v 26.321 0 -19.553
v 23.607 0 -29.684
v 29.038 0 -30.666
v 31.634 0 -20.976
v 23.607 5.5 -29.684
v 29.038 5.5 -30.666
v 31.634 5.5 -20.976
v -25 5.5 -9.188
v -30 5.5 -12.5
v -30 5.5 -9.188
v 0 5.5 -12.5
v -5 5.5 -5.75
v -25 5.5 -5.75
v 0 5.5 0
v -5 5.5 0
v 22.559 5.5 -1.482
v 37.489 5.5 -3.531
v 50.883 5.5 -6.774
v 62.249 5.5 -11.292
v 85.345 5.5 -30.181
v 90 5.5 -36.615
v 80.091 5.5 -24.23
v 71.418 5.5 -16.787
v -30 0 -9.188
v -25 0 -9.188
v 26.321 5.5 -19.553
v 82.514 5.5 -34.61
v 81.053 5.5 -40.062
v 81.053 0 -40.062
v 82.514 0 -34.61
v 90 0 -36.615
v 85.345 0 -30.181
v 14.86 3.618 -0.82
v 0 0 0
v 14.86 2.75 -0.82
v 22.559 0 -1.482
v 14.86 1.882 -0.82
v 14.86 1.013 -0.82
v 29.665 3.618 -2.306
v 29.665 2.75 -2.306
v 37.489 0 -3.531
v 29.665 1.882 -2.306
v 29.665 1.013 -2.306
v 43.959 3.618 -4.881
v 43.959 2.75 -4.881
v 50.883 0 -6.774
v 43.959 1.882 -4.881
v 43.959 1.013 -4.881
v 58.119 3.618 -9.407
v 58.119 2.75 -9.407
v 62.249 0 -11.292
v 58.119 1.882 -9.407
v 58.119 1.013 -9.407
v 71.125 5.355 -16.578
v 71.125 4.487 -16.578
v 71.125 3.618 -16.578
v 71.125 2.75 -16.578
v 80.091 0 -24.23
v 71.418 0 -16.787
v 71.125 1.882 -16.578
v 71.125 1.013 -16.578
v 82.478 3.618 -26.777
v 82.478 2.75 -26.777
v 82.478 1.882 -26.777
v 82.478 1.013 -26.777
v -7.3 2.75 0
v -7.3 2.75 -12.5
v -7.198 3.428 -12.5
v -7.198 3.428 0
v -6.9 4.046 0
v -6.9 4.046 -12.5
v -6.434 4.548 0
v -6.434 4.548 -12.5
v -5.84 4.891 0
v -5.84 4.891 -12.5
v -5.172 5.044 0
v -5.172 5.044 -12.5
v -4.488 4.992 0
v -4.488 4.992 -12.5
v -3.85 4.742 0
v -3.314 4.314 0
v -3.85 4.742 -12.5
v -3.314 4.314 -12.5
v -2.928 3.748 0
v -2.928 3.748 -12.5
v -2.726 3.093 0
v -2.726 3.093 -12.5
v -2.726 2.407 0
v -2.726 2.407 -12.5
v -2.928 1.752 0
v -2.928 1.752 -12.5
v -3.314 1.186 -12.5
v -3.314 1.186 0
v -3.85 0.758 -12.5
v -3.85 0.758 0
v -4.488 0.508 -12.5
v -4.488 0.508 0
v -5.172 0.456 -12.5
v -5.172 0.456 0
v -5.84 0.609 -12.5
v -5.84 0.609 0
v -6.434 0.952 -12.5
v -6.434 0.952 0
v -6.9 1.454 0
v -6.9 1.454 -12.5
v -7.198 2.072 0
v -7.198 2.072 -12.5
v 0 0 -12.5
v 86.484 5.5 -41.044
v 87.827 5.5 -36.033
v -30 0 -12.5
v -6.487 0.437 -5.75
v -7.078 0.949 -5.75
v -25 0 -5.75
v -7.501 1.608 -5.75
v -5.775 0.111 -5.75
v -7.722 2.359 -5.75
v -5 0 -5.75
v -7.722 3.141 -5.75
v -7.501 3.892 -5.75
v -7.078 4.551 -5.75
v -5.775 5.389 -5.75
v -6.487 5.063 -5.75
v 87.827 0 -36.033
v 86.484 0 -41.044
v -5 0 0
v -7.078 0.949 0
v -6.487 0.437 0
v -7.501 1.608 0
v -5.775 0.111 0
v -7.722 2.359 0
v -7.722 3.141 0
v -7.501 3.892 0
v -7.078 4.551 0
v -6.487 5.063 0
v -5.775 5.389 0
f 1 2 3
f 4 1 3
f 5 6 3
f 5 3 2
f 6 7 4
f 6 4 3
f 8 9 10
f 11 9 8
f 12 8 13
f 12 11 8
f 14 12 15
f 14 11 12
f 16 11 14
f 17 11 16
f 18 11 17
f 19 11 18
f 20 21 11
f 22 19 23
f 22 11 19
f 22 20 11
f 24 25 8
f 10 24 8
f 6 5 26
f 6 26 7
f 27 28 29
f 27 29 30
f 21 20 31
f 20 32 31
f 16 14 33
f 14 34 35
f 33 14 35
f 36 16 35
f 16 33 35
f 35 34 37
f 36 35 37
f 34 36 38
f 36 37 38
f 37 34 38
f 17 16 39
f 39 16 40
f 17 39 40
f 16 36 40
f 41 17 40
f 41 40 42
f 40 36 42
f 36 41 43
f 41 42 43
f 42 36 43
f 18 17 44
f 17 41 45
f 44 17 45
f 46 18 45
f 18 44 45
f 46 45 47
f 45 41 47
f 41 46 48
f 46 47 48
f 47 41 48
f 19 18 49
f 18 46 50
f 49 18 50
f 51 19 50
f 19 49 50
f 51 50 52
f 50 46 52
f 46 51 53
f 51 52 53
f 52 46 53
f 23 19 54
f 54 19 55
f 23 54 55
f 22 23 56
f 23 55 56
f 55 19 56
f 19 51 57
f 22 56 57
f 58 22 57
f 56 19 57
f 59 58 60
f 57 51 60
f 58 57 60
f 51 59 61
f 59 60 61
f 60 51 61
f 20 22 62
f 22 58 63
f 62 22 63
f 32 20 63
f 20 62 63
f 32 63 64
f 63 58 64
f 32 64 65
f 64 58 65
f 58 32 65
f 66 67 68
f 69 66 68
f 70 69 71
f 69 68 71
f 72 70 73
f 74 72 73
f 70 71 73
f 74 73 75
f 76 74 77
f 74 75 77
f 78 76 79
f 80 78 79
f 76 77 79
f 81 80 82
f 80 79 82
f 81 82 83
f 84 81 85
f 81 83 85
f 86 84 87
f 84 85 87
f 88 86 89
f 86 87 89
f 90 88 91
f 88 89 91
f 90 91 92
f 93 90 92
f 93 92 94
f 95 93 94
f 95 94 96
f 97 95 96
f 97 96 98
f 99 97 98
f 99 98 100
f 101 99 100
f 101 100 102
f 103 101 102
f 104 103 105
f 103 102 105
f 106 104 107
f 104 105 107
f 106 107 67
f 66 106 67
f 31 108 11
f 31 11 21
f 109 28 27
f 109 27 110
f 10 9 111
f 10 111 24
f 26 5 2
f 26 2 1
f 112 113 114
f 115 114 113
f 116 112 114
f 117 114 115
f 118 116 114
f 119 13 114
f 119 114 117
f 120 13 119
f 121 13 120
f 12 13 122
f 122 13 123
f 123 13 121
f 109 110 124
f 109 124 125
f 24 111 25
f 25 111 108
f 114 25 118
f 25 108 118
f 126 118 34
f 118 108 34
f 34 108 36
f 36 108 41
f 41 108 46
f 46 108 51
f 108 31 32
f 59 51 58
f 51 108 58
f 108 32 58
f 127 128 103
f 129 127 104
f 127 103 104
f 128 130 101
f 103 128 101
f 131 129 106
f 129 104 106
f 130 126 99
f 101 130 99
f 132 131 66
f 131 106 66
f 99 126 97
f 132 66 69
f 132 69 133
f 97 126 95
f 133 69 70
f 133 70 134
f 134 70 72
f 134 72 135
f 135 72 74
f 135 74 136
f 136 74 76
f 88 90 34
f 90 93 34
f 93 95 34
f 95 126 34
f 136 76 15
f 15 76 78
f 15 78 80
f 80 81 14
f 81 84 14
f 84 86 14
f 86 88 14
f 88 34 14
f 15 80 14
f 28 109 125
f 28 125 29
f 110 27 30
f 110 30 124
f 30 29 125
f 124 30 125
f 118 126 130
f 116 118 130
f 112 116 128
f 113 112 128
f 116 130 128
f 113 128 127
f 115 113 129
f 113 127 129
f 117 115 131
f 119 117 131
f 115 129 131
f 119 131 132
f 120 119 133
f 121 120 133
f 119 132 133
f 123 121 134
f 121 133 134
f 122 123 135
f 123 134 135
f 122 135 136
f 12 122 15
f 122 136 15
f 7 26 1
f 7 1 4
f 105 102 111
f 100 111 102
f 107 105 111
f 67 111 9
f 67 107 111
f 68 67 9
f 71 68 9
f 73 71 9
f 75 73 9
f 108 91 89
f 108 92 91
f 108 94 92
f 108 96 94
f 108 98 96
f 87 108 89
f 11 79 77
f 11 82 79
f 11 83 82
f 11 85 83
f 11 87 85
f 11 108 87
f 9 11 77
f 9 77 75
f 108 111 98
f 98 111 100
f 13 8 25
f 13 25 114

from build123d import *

# Parameters (mm, degrees)
SALIENTE_EXTRUIR1_DEPTH   = 5.5
CROQUIS3_W                = 12.5
CROQUIS3_H                = 5.5
SALIENTE_EXTRUIR2_DEPTH   = 25
CROQUIS4_R                = 2.3
CORTAR_EXTRUIR3_DEPTH     = 12.5
CORTAR_EXTRUIR2_DEPTH     = 5.75
CROQUIS6_W                = 3.3125
CROQUIS6_H                = 5.5
SALIENTE_EXTRUIR3_DEPTH   = 5
SALIENTE_EXTRUIR6_DEPTH   = 5.5
SALIENTE_EXTRUIR6_2_DEPTH = 5.5


with BuildPart() as part:
    # Croquis2 → Saliente-Extruir1 (new body)
    with BuildSketch(Plane(origin=(0, 0, 0), x_dir=(1, 0, 0), z_dir=(0, 1, 0))):
        with BuildLine():
            Line((0, 0), (0, 12.5))
            Line((0, 12.5), (90, 36.615427319))
            add(Edge.make_bspline(
                [(0, 0), (0.391394635, 0.015775005), (1.186974035, 0.048775969), (2.973718865, 0.125104104), (4.540088904, 0.200260299), (6.566615662, 0.300718996), (8.325276336, 0.397659311), (10.239345298, 0.508699867), (12.06569896, 0.624646025), (14.401457649, 0.783062706), (17.174575564, 0.991527453), (20.424315772, 1.267095632), (24.124041131, 1.631890725), (28.746499447, 2.160588299), (34.186717026, 2.916408992), (39.59920567, 3.869463595), (44.959442778, 5.077074293), (49.361815827, 6.280418231), (52.910692092, 7.400878923), (56.408168852, 8.673928793), (59.841449897, 10.111450972), (63.196917977, 11.722972852), (66.459987179, 13.514457641), (69.616669404, 15.487724177), (72.654216734, 17.639793831), (75.562633469, 19.963554552), (78.411401775, 22.516402339), (80.637238299, 24.750127709), (82.31420302, 26.576865179), (83.500174761, 27.941909388), (84.166451521, 28.729544399), (84.824720597, 29.529498585), (85.467901785, 30.330572576), (86.10961807, 31.152932899), (86.725824802, 31.959637263), (87.359215775, 32.814913902), (87.935303716, 33.605334305), (88.585351463, 34.5293994), (89.07725637, 35.234721433), (89.639386065, 36.072003958), (89.880241627, 36.43386466), (90, 36.615427319)],
                knots=[0.074542826, 0.074542826, 0.074542826, 0.074542826, 0.074542826, 0.089942005, 0.105341185, 0.120740364, 0.136139543, 0.151538723, 0.166937902, 0.182337082, 0.197736262, 0.22853462, 0.259332978, 0.290131335, 0.320929692, 0.382526405, 0.441205382, 0.472003704, 0.502802054, 0.533600416, 0.564398766, 0.595197066, 0.625995423, 0.656793872, 0.687592091, 0.718390433, 0.749188737, 0.779987363, 0.814189109, 0.822739652, 0.831290195, 0.839840738, 0.848391281, 0.856941796, 0.865492311, 0.874042825, 0.88259334, 0.891143874, 0.899694409, 0.908244943, 0.916795477, 0.916795477, 0.916795477, 0.916795477, 0.916795477], degree=4))
        make_face()
    extrude(amount=SALIENTE_EXTRUIR1_DEPTH)

    # Croquis3 → Saliente-Extruir2 (add)
    with BuildSketch(Plane.ZY):
        with Locations((-6.25, 2.75)):
            Rectangle(CROQUIS3_W, CROQUIS3_H)
    extrude(amount=SALIENTE_EXTRUIR2_DEPTH)

    # Croquis4 → Cortar-Extruir3 (cut)
    with BuildSketch(Plane(origin=(0, 0, -12.5), x_dir=(-1, 0, 0), z_dir=(0, 0, -1))):
        with Locations((5, 2.75)):
            Circle(CROQUIS4_R)
    extrude(amount=-CORTAR_EXTRUIR3_DEPTH, mode=Mode.SUBTRACT)

    # Croquis5 → Cortar-Extruir2 (cut)
    with BuildSketch(Plane.XY):
        with BuildLine():
            Line((-16, 5.5), (-25, 5.5))
            Line((-25, 5.5), (-25, 0))
            Line((-25, 0), (-5, 0))
            ThreePointArc((-5, 0), (-7.75, 2.75), (-5, 5.5))
            Line((-5, 5.5), (-16, 5.5))
        make_face()
    extrude(amount=-CORTAR_EXTRUIR2_DEPTH, mode=Mode.SUBTRACT)

    # Croquis6 → Saliente-Extruir3 (add)
    with BuildSketch(Plane.ZY.offset(25)):
        with Locations((-10.84375, 2.75)):
            Rectangle(CROQUIS6_W, CROQUIS6_H)
    extrude(amount=SALIENTE_EXTRUIR3_DEPTH)


with BuildPart() as body_2:
    # Croquis9 → Saliente-Extruir6 (new body)
    with BuildSketch(Plane(origin=(0, 5.5, 0), x_dir=(1, 0, 0), z_dir=(0, 1, 0))):
        Polygon((81.052969303, 40.062499841), (82.514074846, 34.60957972), (87.826666891, 36.033084468), (86.484084799, 41.043669048), align=None)
    extrude(amount=-SALIENTE_EXTRUIR6_DEPTH)


with BuildPart() as body_3:
    # Croquis9 → Saliente-Extruir6 2 (new body)
    with BuildSketch(Plane(origin=(0, 5.5, 0), x_dir=(1, 0, 0), z_dir=(0, 1, 0))):
        Polygon((23.606721454, 29.684431199), (26.321478766, 19.552818979), (31.634070811, 20.976323727), (29.03783695, 30.665600406), align=None)
    extrude(amount=-SALIENTE_EXTRUIR6_2_DEPTH)


solid = Compound([part.part, body_2.part, body_3.part])
